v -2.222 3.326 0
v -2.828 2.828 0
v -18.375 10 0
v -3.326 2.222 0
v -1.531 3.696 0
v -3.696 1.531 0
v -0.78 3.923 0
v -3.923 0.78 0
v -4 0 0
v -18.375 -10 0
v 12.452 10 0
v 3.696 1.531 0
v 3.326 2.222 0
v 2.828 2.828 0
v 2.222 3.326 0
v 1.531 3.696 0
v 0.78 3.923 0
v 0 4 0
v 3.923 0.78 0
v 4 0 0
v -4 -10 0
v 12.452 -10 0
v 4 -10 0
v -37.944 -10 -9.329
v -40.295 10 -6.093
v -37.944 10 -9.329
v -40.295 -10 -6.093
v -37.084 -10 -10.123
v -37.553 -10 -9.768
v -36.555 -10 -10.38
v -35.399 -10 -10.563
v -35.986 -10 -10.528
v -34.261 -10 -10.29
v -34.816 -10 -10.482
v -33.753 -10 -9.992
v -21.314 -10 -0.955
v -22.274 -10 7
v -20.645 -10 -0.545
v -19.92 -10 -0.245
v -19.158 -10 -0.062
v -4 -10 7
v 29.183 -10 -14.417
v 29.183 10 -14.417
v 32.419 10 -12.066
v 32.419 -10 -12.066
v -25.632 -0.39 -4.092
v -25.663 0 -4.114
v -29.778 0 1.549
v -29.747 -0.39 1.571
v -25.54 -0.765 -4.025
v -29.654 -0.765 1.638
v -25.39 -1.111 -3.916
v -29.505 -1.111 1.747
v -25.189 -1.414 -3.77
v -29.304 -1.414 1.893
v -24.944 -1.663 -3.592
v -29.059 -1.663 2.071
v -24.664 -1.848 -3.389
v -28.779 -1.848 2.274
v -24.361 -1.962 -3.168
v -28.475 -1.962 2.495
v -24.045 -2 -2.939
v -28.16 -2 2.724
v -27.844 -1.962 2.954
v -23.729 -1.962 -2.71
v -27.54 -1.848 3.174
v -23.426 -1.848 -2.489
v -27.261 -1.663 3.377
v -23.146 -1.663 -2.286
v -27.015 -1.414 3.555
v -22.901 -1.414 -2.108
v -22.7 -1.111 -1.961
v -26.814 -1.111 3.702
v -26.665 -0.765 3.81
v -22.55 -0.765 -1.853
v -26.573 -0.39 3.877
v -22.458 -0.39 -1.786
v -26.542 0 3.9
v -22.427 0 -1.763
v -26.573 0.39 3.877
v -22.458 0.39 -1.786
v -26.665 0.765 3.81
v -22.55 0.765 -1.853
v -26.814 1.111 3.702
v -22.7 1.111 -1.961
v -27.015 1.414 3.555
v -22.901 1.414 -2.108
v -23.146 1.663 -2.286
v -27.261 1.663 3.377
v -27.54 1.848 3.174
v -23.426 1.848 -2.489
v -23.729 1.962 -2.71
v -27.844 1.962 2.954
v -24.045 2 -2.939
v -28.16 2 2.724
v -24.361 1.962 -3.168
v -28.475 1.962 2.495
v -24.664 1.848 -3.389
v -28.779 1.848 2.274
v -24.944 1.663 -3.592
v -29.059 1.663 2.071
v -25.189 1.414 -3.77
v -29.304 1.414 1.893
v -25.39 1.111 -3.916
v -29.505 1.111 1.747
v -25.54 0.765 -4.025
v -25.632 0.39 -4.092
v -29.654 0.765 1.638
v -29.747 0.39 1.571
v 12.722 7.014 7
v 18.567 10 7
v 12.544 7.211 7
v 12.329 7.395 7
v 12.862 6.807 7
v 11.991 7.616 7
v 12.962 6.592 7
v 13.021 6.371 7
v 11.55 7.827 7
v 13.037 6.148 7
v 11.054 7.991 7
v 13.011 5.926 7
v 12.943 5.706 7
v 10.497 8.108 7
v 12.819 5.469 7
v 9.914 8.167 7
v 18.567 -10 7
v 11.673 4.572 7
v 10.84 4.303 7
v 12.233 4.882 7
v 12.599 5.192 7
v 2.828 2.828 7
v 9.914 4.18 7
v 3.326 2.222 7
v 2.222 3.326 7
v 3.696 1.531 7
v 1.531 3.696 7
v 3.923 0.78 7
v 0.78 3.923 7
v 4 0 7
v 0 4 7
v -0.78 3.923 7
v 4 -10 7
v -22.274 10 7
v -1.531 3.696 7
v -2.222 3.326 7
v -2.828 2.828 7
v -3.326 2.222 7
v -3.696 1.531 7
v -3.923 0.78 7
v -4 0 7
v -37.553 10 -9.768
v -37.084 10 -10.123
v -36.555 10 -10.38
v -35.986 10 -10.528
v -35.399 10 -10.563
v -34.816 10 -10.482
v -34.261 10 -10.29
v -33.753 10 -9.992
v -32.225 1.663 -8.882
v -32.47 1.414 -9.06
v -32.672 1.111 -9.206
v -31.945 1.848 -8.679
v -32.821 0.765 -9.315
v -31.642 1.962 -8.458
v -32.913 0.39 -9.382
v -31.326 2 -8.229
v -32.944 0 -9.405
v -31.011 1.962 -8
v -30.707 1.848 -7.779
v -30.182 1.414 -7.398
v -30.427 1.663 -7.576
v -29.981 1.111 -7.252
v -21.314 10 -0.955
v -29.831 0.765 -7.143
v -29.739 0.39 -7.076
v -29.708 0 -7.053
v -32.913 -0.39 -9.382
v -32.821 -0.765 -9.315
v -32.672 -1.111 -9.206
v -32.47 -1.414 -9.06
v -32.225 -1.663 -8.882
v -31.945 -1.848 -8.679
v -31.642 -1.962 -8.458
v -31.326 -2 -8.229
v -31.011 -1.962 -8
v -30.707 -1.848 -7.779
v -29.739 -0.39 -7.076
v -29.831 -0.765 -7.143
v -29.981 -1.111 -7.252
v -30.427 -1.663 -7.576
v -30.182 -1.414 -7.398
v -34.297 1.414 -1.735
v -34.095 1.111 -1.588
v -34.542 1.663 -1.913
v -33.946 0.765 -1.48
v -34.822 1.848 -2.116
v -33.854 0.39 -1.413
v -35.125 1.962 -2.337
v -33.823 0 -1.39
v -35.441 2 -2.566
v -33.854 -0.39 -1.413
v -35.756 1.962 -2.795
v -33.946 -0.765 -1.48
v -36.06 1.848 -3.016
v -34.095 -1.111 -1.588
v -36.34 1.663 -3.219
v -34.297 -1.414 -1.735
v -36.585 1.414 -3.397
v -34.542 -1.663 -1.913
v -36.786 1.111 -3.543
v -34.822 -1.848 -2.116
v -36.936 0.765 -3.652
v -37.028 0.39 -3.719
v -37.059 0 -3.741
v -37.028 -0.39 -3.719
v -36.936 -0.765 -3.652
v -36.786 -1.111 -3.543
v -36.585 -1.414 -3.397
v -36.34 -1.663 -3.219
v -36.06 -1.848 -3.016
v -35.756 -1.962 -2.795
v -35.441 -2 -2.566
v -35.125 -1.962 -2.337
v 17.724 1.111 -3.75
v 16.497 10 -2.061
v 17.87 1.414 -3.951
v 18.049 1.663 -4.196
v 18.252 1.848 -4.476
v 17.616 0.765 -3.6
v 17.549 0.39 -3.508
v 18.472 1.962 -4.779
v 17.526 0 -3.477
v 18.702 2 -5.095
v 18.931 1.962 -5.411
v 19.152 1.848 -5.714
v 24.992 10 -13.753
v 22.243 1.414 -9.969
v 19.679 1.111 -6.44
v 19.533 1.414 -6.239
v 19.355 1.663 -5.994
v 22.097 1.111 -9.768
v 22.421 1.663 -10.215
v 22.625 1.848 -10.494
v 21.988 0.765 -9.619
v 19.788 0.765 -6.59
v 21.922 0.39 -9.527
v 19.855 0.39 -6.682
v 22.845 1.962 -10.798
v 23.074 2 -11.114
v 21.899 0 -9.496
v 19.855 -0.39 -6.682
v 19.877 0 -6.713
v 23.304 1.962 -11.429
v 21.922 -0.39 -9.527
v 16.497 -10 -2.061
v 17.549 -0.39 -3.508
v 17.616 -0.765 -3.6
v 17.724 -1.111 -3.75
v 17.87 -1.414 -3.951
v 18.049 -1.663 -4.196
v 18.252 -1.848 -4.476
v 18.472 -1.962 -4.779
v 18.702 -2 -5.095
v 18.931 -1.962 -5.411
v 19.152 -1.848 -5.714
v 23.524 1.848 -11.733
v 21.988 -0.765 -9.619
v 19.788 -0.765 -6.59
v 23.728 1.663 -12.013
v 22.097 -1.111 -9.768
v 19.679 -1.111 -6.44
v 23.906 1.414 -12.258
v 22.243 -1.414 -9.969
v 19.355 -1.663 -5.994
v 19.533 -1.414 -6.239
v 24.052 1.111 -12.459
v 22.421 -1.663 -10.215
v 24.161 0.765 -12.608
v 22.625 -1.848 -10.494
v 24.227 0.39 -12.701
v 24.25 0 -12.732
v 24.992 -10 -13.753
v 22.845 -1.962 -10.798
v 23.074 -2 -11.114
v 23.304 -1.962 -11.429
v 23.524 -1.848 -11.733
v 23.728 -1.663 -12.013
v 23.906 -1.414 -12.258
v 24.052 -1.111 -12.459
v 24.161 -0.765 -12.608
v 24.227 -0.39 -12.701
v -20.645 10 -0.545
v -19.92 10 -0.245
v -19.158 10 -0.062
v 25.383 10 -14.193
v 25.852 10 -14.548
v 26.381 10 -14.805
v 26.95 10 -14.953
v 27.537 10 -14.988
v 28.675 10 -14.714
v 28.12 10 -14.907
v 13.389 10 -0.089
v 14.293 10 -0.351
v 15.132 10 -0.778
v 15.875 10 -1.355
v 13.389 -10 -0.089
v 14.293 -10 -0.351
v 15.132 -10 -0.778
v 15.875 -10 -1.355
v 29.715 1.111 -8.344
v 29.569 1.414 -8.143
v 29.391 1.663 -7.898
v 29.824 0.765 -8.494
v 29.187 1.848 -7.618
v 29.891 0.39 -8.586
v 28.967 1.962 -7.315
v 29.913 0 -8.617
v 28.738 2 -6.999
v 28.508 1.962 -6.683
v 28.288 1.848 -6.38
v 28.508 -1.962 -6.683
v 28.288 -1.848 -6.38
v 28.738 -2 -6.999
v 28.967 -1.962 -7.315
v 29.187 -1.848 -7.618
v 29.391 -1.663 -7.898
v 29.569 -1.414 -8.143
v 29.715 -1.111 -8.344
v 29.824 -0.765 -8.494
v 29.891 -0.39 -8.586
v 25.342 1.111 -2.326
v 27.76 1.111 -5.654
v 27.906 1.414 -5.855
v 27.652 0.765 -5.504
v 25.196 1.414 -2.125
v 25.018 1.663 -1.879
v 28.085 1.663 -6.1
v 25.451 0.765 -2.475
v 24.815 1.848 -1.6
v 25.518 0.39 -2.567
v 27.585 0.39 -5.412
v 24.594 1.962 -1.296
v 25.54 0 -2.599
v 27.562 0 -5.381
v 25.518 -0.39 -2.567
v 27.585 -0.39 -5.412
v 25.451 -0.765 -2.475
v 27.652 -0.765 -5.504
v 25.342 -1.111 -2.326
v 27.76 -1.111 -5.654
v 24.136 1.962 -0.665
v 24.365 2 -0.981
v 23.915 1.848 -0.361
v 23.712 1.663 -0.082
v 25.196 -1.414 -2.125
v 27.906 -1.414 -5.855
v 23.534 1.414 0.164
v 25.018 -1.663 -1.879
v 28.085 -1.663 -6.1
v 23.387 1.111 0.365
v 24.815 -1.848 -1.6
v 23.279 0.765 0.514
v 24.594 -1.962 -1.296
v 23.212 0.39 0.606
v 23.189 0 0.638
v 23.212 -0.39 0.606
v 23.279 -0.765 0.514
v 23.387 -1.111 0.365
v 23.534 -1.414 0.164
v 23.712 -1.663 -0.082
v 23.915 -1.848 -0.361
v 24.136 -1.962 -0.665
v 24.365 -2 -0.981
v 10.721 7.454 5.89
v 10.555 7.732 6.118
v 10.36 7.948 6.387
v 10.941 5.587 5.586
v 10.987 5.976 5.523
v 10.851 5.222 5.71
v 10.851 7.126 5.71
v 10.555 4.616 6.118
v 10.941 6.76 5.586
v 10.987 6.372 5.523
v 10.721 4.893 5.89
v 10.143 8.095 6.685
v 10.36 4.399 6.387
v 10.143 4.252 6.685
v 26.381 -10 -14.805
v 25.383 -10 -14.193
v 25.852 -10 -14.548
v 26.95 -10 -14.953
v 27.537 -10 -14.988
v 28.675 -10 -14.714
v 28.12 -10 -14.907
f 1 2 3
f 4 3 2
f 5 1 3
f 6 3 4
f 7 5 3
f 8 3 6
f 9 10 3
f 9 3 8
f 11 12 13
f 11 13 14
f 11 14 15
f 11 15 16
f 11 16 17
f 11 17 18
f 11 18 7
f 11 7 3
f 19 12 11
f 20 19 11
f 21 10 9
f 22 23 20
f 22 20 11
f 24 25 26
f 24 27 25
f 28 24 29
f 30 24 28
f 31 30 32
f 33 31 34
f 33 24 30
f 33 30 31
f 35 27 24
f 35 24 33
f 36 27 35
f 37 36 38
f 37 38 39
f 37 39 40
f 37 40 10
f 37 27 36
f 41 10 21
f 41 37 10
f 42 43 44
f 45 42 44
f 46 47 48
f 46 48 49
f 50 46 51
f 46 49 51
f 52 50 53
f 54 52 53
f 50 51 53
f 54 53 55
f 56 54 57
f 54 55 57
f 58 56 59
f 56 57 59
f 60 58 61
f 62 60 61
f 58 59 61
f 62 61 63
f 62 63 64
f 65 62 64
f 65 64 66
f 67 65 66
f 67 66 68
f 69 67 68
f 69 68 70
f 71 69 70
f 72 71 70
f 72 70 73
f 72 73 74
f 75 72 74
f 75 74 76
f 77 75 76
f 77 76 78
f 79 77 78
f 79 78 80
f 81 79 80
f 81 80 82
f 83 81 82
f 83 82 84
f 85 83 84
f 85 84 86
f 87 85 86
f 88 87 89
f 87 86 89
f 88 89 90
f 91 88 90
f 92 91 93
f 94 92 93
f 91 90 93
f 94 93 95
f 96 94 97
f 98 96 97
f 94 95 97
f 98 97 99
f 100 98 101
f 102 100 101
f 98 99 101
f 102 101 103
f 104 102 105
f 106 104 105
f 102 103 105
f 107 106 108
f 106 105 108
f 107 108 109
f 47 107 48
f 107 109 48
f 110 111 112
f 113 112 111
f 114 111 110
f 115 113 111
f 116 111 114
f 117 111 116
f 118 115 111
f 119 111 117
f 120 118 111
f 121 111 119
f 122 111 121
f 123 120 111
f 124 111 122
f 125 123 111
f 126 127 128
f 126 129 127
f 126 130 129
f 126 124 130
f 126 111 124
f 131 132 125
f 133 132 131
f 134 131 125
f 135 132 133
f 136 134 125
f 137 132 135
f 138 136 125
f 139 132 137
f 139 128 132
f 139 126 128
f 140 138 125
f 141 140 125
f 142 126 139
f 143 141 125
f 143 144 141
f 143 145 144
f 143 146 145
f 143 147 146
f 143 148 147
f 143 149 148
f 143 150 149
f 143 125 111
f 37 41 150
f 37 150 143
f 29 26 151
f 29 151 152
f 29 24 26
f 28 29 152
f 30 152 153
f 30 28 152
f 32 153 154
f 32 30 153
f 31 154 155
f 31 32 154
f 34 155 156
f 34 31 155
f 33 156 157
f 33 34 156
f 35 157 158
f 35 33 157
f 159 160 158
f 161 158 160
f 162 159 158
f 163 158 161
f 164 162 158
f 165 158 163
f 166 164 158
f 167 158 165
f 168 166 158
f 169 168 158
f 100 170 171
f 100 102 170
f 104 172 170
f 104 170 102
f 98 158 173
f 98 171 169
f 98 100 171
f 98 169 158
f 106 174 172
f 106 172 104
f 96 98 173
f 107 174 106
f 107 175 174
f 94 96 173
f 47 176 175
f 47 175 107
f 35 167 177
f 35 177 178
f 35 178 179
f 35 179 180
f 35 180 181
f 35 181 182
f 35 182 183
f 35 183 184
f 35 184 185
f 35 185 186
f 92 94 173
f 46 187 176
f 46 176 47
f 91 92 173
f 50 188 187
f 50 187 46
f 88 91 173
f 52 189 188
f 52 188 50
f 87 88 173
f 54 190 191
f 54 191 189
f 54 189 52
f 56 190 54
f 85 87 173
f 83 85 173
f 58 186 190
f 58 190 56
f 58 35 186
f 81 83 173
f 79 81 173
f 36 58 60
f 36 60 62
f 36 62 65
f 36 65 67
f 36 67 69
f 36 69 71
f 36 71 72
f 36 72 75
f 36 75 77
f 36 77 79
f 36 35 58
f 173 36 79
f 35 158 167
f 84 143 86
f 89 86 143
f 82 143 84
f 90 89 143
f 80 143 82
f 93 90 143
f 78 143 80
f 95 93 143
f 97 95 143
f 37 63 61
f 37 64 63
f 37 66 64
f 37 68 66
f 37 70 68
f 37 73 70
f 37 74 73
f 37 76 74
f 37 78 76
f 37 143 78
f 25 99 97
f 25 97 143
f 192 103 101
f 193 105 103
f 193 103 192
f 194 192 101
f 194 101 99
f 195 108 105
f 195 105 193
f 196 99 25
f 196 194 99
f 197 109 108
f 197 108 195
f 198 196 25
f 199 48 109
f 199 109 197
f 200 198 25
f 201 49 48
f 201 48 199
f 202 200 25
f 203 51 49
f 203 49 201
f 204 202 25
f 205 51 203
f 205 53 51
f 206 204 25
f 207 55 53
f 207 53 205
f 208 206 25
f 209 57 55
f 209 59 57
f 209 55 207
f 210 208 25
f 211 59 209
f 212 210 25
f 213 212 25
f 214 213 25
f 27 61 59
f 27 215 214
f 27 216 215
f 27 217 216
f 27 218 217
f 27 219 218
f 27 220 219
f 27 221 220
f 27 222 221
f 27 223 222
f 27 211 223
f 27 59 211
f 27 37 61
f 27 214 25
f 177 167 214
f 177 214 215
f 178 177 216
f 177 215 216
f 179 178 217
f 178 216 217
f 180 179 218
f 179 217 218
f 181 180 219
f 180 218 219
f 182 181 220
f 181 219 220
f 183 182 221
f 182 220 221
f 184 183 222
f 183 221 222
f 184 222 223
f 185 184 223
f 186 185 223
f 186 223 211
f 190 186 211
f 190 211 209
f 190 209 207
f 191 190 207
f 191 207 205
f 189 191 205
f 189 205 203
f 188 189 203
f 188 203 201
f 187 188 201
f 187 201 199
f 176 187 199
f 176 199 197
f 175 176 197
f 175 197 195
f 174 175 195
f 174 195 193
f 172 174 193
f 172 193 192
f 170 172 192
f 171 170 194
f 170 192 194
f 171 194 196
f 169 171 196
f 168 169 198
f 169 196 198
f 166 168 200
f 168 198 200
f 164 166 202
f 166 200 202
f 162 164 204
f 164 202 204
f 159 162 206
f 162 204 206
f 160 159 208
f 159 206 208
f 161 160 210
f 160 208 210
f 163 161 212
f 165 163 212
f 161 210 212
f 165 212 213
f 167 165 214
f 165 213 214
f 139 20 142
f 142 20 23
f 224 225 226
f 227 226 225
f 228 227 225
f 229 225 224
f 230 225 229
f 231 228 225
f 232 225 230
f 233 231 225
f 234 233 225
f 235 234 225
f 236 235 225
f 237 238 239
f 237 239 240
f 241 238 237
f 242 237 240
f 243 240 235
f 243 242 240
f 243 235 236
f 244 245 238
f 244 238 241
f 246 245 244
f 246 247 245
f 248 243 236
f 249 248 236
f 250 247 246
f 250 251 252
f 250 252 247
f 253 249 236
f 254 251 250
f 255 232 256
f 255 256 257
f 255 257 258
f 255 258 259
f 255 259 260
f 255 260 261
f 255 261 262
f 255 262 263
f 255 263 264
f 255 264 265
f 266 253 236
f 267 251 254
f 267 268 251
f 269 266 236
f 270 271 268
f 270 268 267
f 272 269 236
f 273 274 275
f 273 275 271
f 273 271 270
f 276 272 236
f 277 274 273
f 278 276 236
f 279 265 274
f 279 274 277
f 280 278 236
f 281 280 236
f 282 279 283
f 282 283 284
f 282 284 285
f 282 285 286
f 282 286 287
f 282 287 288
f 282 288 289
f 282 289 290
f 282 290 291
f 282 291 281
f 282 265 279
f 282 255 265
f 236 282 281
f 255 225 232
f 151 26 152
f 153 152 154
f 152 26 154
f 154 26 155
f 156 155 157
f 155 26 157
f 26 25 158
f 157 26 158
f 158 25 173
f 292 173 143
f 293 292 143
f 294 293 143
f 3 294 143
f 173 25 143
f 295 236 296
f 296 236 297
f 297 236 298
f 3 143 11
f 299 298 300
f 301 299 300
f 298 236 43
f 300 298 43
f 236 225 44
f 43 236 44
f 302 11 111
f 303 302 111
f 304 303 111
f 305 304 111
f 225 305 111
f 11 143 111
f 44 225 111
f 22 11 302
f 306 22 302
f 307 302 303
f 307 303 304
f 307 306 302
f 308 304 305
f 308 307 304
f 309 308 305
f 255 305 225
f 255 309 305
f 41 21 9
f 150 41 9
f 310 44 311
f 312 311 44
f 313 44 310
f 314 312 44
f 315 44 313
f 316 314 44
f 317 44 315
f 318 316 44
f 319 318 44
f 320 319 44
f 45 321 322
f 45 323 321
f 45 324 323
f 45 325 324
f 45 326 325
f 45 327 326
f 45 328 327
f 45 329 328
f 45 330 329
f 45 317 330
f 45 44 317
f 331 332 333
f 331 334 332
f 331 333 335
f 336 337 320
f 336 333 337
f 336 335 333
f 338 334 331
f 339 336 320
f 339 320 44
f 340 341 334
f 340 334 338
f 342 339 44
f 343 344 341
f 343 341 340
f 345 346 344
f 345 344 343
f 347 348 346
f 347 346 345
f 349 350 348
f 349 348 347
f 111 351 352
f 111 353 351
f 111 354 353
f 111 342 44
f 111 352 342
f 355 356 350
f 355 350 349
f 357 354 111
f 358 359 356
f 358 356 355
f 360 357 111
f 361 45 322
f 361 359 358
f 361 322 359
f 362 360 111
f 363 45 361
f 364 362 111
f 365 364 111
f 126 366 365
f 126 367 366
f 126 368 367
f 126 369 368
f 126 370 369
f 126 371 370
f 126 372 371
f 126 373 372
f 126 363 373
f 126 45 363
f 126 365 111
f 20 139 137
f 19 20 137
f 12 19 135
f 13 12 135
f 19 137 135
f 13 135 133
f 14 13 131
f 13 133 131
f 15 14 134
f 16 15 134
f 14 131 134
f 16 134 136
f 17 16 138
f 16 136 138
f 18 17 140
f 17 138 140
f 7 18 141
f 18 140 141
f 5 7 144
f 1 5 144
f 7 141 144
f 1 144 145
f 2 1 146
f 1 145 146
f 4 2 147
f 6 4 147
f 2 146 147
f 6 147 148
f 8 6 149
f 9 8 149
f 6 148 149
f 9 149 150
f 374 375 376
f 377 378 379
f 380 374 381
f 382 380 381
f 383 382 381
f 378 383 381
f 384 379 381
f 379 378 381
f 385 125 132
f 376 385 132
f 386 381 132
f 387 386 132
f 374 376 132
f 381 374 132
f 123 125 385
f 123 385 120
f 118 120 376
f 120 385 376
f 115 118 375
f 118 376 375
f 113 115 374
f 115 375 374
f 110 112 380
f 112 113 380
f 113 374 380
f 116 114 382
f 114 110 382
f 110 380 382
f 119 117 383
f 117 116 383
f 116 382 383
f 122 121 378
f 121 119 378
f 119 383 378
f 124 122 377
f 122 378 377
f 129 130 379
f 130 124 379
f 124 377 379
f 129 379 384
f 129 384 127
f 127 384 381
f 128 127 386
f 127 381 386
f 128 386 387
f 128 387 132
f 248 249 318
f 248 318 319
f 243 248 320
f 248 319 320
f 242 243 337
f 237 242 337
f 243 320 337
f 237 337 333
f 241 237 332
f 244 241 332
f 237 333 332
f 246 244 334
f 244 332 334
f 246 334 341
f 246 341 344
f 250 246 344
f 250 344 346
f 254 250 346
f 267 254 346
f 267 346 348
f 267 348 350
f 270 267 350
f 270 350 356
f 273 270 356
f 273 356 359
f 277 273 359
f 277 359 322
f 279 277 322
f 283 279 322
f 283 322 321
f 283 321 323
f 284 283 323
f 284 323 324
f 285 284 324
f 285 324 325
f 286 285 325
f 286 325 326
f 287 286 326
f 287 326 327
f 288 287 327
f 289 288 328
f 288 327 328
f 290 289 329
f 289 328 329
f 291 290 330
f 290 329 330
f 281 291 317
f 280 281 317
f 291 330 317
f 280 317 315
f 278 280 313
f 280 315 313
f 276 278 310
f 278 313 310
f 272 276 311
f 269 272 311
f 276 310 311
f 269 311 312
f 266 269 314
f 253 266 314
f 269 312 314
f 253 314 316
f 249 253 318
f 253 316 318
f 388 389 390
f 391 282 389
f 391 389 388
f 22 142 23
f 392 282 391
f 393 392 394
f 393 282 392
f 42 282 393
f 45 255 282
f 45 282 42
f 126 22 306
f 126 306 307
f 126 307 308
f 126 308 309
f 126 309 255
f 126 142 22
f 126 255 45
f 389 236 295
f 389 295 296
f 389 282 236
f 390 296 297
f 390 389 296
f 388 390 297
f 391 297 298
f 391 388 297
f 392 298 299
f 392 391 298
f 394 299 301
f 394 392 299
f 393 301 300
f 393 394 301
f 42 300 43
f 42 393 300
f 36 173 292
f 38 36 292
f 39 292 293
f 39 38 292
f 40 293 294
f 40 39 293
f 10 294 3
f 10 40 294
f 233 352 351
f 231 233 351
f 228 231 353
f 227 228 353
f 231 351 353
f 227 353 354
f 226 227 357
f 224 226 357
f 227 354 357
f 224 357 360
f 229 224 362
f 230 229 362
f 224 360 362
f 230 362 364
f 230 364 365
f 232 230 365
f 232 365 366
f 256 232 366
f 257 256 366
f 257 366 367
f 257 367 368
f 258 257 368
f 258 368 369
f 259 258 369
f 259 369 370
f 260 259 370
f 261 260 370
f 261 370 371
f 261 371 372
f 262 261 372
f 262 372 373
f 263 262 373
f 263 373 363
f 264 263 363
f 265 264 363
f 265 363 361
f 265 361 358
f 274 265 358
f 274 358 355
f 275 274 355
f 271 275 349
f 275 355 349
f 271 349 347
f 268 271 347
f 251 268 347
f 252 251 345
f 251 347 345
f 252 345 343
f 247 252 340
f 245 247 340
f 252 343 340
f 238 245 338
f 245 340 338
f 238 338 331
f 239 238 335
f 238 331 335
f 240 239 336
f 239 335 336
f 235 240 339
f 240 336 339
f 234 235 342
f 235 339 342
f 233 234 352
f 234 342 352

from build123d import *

# Parameters (mm, degrees)
F1_DEPTH      = 10
F1_DEPTH_BACK = 10
F3_D          = 4
F5_D          = 4
F5_DEPTH      = 18.2076214093
F7_D          = 8
F8_R          = 3
F9_R          = 5
F11_D         = 4
F13_DEPTH     = 25


with BuildPart() as f1:
    # F0 (on Front) → F1 (new body, two sides)
    with BuildSketch(Plane.XZ) as f1_sk:
        Polygon((-40.2948366535, -6.0925860852), (-36.1803398875, -11.7557050458), (-20, 0), (15, 0), (26.7557050458, -16.1803398875), (32.4188240065, -12.0658431215), (18.5666781465, 7), (-22.2744378736, 7), align=None)
    extrude(amount=F1_DEPTH)
    extrude(f1_sk.sketch, amount=-F1_DEPTH_BACK)

    # F3 (through all)
    with Locations(Plane(origin=(-6.9098300563, 0, 9.510565163), x_dir=(0.8090169944, 0, 0.5877852523), z_dir=(0.5877852523, 0, -0.8090169944))):
        with Locations((0, -37.8532769899), (0, -24.0082326065), (-30.1803398875, 0), (-21.1803398875, 0)):
            Hole(F3_D / 2)

    # F5 (through all, one way)
    with BuildSketch(Plane(origin=(9.8176274578, 0, 7.1329238722), x_dir=(0, -1, 0), z_dir=(-0.8090169944, 0, -0.5877852523))):
        with Locations((16.0583042515, 0), (-6.1736582538, 0)):
            Circle(F5_D / 2)
    extrude(amount=-F5_DEPTH, mode=Mode.SUBTRACT)

    # F7 (through all)
    with Locations(Plane(origin=(0, 0, 0), x_dir=(1, 0, 0), z_dir=(0, 0, -1))):
        with Locations((0, 0)):
            Hole(F7_D / 2)

    # F8
    f8_edges = [f1.edges().sort_by_distance(p)[0] for p in [
        (-36.18034, 0, -11.755705),
        (26.755705, 0, -16.18034),
    ]]
    fillet(f8_edges, radius=F8_R)

    # F9
    f9_edges = [f1.edges().sort_by_distance(p)[0] for p in [
        (-20, 0, 0),
        (15, 0, 0),
    ]]
    fillet(f9_edges, radius=F9_R)

    # F11 (through all)
    with Locations(Plane(origin=(9.8176274578, 0, 7.1329238722), x_dir=(0, -1, 0), z_dir=(-0.8090169944, 0, -0.5877852523))):
        with Locations((0, -15.1145784184), (0, -22.5539375097)):
            Hole(F11_D / 2)

    # F12 (on face) → F13 (cut)
    with BuildSketch(Plane(origin=(0, 0, 0), x_dir=(1, 0, 0), z_dir=(0, 0, -1))):
        with BuildLine():
            Line((-4, 10), (-4, 0))
            ThreePointArc((-4, 0), (0, 4), (4, 0))
            Line((4, 0), (4, 10))
            Line((4, 10), (-4, 10))
        make_face()
    extrude(amount=-F13_DEPTH, mode=Mode.SUBTRACT)


solid = f1.part
